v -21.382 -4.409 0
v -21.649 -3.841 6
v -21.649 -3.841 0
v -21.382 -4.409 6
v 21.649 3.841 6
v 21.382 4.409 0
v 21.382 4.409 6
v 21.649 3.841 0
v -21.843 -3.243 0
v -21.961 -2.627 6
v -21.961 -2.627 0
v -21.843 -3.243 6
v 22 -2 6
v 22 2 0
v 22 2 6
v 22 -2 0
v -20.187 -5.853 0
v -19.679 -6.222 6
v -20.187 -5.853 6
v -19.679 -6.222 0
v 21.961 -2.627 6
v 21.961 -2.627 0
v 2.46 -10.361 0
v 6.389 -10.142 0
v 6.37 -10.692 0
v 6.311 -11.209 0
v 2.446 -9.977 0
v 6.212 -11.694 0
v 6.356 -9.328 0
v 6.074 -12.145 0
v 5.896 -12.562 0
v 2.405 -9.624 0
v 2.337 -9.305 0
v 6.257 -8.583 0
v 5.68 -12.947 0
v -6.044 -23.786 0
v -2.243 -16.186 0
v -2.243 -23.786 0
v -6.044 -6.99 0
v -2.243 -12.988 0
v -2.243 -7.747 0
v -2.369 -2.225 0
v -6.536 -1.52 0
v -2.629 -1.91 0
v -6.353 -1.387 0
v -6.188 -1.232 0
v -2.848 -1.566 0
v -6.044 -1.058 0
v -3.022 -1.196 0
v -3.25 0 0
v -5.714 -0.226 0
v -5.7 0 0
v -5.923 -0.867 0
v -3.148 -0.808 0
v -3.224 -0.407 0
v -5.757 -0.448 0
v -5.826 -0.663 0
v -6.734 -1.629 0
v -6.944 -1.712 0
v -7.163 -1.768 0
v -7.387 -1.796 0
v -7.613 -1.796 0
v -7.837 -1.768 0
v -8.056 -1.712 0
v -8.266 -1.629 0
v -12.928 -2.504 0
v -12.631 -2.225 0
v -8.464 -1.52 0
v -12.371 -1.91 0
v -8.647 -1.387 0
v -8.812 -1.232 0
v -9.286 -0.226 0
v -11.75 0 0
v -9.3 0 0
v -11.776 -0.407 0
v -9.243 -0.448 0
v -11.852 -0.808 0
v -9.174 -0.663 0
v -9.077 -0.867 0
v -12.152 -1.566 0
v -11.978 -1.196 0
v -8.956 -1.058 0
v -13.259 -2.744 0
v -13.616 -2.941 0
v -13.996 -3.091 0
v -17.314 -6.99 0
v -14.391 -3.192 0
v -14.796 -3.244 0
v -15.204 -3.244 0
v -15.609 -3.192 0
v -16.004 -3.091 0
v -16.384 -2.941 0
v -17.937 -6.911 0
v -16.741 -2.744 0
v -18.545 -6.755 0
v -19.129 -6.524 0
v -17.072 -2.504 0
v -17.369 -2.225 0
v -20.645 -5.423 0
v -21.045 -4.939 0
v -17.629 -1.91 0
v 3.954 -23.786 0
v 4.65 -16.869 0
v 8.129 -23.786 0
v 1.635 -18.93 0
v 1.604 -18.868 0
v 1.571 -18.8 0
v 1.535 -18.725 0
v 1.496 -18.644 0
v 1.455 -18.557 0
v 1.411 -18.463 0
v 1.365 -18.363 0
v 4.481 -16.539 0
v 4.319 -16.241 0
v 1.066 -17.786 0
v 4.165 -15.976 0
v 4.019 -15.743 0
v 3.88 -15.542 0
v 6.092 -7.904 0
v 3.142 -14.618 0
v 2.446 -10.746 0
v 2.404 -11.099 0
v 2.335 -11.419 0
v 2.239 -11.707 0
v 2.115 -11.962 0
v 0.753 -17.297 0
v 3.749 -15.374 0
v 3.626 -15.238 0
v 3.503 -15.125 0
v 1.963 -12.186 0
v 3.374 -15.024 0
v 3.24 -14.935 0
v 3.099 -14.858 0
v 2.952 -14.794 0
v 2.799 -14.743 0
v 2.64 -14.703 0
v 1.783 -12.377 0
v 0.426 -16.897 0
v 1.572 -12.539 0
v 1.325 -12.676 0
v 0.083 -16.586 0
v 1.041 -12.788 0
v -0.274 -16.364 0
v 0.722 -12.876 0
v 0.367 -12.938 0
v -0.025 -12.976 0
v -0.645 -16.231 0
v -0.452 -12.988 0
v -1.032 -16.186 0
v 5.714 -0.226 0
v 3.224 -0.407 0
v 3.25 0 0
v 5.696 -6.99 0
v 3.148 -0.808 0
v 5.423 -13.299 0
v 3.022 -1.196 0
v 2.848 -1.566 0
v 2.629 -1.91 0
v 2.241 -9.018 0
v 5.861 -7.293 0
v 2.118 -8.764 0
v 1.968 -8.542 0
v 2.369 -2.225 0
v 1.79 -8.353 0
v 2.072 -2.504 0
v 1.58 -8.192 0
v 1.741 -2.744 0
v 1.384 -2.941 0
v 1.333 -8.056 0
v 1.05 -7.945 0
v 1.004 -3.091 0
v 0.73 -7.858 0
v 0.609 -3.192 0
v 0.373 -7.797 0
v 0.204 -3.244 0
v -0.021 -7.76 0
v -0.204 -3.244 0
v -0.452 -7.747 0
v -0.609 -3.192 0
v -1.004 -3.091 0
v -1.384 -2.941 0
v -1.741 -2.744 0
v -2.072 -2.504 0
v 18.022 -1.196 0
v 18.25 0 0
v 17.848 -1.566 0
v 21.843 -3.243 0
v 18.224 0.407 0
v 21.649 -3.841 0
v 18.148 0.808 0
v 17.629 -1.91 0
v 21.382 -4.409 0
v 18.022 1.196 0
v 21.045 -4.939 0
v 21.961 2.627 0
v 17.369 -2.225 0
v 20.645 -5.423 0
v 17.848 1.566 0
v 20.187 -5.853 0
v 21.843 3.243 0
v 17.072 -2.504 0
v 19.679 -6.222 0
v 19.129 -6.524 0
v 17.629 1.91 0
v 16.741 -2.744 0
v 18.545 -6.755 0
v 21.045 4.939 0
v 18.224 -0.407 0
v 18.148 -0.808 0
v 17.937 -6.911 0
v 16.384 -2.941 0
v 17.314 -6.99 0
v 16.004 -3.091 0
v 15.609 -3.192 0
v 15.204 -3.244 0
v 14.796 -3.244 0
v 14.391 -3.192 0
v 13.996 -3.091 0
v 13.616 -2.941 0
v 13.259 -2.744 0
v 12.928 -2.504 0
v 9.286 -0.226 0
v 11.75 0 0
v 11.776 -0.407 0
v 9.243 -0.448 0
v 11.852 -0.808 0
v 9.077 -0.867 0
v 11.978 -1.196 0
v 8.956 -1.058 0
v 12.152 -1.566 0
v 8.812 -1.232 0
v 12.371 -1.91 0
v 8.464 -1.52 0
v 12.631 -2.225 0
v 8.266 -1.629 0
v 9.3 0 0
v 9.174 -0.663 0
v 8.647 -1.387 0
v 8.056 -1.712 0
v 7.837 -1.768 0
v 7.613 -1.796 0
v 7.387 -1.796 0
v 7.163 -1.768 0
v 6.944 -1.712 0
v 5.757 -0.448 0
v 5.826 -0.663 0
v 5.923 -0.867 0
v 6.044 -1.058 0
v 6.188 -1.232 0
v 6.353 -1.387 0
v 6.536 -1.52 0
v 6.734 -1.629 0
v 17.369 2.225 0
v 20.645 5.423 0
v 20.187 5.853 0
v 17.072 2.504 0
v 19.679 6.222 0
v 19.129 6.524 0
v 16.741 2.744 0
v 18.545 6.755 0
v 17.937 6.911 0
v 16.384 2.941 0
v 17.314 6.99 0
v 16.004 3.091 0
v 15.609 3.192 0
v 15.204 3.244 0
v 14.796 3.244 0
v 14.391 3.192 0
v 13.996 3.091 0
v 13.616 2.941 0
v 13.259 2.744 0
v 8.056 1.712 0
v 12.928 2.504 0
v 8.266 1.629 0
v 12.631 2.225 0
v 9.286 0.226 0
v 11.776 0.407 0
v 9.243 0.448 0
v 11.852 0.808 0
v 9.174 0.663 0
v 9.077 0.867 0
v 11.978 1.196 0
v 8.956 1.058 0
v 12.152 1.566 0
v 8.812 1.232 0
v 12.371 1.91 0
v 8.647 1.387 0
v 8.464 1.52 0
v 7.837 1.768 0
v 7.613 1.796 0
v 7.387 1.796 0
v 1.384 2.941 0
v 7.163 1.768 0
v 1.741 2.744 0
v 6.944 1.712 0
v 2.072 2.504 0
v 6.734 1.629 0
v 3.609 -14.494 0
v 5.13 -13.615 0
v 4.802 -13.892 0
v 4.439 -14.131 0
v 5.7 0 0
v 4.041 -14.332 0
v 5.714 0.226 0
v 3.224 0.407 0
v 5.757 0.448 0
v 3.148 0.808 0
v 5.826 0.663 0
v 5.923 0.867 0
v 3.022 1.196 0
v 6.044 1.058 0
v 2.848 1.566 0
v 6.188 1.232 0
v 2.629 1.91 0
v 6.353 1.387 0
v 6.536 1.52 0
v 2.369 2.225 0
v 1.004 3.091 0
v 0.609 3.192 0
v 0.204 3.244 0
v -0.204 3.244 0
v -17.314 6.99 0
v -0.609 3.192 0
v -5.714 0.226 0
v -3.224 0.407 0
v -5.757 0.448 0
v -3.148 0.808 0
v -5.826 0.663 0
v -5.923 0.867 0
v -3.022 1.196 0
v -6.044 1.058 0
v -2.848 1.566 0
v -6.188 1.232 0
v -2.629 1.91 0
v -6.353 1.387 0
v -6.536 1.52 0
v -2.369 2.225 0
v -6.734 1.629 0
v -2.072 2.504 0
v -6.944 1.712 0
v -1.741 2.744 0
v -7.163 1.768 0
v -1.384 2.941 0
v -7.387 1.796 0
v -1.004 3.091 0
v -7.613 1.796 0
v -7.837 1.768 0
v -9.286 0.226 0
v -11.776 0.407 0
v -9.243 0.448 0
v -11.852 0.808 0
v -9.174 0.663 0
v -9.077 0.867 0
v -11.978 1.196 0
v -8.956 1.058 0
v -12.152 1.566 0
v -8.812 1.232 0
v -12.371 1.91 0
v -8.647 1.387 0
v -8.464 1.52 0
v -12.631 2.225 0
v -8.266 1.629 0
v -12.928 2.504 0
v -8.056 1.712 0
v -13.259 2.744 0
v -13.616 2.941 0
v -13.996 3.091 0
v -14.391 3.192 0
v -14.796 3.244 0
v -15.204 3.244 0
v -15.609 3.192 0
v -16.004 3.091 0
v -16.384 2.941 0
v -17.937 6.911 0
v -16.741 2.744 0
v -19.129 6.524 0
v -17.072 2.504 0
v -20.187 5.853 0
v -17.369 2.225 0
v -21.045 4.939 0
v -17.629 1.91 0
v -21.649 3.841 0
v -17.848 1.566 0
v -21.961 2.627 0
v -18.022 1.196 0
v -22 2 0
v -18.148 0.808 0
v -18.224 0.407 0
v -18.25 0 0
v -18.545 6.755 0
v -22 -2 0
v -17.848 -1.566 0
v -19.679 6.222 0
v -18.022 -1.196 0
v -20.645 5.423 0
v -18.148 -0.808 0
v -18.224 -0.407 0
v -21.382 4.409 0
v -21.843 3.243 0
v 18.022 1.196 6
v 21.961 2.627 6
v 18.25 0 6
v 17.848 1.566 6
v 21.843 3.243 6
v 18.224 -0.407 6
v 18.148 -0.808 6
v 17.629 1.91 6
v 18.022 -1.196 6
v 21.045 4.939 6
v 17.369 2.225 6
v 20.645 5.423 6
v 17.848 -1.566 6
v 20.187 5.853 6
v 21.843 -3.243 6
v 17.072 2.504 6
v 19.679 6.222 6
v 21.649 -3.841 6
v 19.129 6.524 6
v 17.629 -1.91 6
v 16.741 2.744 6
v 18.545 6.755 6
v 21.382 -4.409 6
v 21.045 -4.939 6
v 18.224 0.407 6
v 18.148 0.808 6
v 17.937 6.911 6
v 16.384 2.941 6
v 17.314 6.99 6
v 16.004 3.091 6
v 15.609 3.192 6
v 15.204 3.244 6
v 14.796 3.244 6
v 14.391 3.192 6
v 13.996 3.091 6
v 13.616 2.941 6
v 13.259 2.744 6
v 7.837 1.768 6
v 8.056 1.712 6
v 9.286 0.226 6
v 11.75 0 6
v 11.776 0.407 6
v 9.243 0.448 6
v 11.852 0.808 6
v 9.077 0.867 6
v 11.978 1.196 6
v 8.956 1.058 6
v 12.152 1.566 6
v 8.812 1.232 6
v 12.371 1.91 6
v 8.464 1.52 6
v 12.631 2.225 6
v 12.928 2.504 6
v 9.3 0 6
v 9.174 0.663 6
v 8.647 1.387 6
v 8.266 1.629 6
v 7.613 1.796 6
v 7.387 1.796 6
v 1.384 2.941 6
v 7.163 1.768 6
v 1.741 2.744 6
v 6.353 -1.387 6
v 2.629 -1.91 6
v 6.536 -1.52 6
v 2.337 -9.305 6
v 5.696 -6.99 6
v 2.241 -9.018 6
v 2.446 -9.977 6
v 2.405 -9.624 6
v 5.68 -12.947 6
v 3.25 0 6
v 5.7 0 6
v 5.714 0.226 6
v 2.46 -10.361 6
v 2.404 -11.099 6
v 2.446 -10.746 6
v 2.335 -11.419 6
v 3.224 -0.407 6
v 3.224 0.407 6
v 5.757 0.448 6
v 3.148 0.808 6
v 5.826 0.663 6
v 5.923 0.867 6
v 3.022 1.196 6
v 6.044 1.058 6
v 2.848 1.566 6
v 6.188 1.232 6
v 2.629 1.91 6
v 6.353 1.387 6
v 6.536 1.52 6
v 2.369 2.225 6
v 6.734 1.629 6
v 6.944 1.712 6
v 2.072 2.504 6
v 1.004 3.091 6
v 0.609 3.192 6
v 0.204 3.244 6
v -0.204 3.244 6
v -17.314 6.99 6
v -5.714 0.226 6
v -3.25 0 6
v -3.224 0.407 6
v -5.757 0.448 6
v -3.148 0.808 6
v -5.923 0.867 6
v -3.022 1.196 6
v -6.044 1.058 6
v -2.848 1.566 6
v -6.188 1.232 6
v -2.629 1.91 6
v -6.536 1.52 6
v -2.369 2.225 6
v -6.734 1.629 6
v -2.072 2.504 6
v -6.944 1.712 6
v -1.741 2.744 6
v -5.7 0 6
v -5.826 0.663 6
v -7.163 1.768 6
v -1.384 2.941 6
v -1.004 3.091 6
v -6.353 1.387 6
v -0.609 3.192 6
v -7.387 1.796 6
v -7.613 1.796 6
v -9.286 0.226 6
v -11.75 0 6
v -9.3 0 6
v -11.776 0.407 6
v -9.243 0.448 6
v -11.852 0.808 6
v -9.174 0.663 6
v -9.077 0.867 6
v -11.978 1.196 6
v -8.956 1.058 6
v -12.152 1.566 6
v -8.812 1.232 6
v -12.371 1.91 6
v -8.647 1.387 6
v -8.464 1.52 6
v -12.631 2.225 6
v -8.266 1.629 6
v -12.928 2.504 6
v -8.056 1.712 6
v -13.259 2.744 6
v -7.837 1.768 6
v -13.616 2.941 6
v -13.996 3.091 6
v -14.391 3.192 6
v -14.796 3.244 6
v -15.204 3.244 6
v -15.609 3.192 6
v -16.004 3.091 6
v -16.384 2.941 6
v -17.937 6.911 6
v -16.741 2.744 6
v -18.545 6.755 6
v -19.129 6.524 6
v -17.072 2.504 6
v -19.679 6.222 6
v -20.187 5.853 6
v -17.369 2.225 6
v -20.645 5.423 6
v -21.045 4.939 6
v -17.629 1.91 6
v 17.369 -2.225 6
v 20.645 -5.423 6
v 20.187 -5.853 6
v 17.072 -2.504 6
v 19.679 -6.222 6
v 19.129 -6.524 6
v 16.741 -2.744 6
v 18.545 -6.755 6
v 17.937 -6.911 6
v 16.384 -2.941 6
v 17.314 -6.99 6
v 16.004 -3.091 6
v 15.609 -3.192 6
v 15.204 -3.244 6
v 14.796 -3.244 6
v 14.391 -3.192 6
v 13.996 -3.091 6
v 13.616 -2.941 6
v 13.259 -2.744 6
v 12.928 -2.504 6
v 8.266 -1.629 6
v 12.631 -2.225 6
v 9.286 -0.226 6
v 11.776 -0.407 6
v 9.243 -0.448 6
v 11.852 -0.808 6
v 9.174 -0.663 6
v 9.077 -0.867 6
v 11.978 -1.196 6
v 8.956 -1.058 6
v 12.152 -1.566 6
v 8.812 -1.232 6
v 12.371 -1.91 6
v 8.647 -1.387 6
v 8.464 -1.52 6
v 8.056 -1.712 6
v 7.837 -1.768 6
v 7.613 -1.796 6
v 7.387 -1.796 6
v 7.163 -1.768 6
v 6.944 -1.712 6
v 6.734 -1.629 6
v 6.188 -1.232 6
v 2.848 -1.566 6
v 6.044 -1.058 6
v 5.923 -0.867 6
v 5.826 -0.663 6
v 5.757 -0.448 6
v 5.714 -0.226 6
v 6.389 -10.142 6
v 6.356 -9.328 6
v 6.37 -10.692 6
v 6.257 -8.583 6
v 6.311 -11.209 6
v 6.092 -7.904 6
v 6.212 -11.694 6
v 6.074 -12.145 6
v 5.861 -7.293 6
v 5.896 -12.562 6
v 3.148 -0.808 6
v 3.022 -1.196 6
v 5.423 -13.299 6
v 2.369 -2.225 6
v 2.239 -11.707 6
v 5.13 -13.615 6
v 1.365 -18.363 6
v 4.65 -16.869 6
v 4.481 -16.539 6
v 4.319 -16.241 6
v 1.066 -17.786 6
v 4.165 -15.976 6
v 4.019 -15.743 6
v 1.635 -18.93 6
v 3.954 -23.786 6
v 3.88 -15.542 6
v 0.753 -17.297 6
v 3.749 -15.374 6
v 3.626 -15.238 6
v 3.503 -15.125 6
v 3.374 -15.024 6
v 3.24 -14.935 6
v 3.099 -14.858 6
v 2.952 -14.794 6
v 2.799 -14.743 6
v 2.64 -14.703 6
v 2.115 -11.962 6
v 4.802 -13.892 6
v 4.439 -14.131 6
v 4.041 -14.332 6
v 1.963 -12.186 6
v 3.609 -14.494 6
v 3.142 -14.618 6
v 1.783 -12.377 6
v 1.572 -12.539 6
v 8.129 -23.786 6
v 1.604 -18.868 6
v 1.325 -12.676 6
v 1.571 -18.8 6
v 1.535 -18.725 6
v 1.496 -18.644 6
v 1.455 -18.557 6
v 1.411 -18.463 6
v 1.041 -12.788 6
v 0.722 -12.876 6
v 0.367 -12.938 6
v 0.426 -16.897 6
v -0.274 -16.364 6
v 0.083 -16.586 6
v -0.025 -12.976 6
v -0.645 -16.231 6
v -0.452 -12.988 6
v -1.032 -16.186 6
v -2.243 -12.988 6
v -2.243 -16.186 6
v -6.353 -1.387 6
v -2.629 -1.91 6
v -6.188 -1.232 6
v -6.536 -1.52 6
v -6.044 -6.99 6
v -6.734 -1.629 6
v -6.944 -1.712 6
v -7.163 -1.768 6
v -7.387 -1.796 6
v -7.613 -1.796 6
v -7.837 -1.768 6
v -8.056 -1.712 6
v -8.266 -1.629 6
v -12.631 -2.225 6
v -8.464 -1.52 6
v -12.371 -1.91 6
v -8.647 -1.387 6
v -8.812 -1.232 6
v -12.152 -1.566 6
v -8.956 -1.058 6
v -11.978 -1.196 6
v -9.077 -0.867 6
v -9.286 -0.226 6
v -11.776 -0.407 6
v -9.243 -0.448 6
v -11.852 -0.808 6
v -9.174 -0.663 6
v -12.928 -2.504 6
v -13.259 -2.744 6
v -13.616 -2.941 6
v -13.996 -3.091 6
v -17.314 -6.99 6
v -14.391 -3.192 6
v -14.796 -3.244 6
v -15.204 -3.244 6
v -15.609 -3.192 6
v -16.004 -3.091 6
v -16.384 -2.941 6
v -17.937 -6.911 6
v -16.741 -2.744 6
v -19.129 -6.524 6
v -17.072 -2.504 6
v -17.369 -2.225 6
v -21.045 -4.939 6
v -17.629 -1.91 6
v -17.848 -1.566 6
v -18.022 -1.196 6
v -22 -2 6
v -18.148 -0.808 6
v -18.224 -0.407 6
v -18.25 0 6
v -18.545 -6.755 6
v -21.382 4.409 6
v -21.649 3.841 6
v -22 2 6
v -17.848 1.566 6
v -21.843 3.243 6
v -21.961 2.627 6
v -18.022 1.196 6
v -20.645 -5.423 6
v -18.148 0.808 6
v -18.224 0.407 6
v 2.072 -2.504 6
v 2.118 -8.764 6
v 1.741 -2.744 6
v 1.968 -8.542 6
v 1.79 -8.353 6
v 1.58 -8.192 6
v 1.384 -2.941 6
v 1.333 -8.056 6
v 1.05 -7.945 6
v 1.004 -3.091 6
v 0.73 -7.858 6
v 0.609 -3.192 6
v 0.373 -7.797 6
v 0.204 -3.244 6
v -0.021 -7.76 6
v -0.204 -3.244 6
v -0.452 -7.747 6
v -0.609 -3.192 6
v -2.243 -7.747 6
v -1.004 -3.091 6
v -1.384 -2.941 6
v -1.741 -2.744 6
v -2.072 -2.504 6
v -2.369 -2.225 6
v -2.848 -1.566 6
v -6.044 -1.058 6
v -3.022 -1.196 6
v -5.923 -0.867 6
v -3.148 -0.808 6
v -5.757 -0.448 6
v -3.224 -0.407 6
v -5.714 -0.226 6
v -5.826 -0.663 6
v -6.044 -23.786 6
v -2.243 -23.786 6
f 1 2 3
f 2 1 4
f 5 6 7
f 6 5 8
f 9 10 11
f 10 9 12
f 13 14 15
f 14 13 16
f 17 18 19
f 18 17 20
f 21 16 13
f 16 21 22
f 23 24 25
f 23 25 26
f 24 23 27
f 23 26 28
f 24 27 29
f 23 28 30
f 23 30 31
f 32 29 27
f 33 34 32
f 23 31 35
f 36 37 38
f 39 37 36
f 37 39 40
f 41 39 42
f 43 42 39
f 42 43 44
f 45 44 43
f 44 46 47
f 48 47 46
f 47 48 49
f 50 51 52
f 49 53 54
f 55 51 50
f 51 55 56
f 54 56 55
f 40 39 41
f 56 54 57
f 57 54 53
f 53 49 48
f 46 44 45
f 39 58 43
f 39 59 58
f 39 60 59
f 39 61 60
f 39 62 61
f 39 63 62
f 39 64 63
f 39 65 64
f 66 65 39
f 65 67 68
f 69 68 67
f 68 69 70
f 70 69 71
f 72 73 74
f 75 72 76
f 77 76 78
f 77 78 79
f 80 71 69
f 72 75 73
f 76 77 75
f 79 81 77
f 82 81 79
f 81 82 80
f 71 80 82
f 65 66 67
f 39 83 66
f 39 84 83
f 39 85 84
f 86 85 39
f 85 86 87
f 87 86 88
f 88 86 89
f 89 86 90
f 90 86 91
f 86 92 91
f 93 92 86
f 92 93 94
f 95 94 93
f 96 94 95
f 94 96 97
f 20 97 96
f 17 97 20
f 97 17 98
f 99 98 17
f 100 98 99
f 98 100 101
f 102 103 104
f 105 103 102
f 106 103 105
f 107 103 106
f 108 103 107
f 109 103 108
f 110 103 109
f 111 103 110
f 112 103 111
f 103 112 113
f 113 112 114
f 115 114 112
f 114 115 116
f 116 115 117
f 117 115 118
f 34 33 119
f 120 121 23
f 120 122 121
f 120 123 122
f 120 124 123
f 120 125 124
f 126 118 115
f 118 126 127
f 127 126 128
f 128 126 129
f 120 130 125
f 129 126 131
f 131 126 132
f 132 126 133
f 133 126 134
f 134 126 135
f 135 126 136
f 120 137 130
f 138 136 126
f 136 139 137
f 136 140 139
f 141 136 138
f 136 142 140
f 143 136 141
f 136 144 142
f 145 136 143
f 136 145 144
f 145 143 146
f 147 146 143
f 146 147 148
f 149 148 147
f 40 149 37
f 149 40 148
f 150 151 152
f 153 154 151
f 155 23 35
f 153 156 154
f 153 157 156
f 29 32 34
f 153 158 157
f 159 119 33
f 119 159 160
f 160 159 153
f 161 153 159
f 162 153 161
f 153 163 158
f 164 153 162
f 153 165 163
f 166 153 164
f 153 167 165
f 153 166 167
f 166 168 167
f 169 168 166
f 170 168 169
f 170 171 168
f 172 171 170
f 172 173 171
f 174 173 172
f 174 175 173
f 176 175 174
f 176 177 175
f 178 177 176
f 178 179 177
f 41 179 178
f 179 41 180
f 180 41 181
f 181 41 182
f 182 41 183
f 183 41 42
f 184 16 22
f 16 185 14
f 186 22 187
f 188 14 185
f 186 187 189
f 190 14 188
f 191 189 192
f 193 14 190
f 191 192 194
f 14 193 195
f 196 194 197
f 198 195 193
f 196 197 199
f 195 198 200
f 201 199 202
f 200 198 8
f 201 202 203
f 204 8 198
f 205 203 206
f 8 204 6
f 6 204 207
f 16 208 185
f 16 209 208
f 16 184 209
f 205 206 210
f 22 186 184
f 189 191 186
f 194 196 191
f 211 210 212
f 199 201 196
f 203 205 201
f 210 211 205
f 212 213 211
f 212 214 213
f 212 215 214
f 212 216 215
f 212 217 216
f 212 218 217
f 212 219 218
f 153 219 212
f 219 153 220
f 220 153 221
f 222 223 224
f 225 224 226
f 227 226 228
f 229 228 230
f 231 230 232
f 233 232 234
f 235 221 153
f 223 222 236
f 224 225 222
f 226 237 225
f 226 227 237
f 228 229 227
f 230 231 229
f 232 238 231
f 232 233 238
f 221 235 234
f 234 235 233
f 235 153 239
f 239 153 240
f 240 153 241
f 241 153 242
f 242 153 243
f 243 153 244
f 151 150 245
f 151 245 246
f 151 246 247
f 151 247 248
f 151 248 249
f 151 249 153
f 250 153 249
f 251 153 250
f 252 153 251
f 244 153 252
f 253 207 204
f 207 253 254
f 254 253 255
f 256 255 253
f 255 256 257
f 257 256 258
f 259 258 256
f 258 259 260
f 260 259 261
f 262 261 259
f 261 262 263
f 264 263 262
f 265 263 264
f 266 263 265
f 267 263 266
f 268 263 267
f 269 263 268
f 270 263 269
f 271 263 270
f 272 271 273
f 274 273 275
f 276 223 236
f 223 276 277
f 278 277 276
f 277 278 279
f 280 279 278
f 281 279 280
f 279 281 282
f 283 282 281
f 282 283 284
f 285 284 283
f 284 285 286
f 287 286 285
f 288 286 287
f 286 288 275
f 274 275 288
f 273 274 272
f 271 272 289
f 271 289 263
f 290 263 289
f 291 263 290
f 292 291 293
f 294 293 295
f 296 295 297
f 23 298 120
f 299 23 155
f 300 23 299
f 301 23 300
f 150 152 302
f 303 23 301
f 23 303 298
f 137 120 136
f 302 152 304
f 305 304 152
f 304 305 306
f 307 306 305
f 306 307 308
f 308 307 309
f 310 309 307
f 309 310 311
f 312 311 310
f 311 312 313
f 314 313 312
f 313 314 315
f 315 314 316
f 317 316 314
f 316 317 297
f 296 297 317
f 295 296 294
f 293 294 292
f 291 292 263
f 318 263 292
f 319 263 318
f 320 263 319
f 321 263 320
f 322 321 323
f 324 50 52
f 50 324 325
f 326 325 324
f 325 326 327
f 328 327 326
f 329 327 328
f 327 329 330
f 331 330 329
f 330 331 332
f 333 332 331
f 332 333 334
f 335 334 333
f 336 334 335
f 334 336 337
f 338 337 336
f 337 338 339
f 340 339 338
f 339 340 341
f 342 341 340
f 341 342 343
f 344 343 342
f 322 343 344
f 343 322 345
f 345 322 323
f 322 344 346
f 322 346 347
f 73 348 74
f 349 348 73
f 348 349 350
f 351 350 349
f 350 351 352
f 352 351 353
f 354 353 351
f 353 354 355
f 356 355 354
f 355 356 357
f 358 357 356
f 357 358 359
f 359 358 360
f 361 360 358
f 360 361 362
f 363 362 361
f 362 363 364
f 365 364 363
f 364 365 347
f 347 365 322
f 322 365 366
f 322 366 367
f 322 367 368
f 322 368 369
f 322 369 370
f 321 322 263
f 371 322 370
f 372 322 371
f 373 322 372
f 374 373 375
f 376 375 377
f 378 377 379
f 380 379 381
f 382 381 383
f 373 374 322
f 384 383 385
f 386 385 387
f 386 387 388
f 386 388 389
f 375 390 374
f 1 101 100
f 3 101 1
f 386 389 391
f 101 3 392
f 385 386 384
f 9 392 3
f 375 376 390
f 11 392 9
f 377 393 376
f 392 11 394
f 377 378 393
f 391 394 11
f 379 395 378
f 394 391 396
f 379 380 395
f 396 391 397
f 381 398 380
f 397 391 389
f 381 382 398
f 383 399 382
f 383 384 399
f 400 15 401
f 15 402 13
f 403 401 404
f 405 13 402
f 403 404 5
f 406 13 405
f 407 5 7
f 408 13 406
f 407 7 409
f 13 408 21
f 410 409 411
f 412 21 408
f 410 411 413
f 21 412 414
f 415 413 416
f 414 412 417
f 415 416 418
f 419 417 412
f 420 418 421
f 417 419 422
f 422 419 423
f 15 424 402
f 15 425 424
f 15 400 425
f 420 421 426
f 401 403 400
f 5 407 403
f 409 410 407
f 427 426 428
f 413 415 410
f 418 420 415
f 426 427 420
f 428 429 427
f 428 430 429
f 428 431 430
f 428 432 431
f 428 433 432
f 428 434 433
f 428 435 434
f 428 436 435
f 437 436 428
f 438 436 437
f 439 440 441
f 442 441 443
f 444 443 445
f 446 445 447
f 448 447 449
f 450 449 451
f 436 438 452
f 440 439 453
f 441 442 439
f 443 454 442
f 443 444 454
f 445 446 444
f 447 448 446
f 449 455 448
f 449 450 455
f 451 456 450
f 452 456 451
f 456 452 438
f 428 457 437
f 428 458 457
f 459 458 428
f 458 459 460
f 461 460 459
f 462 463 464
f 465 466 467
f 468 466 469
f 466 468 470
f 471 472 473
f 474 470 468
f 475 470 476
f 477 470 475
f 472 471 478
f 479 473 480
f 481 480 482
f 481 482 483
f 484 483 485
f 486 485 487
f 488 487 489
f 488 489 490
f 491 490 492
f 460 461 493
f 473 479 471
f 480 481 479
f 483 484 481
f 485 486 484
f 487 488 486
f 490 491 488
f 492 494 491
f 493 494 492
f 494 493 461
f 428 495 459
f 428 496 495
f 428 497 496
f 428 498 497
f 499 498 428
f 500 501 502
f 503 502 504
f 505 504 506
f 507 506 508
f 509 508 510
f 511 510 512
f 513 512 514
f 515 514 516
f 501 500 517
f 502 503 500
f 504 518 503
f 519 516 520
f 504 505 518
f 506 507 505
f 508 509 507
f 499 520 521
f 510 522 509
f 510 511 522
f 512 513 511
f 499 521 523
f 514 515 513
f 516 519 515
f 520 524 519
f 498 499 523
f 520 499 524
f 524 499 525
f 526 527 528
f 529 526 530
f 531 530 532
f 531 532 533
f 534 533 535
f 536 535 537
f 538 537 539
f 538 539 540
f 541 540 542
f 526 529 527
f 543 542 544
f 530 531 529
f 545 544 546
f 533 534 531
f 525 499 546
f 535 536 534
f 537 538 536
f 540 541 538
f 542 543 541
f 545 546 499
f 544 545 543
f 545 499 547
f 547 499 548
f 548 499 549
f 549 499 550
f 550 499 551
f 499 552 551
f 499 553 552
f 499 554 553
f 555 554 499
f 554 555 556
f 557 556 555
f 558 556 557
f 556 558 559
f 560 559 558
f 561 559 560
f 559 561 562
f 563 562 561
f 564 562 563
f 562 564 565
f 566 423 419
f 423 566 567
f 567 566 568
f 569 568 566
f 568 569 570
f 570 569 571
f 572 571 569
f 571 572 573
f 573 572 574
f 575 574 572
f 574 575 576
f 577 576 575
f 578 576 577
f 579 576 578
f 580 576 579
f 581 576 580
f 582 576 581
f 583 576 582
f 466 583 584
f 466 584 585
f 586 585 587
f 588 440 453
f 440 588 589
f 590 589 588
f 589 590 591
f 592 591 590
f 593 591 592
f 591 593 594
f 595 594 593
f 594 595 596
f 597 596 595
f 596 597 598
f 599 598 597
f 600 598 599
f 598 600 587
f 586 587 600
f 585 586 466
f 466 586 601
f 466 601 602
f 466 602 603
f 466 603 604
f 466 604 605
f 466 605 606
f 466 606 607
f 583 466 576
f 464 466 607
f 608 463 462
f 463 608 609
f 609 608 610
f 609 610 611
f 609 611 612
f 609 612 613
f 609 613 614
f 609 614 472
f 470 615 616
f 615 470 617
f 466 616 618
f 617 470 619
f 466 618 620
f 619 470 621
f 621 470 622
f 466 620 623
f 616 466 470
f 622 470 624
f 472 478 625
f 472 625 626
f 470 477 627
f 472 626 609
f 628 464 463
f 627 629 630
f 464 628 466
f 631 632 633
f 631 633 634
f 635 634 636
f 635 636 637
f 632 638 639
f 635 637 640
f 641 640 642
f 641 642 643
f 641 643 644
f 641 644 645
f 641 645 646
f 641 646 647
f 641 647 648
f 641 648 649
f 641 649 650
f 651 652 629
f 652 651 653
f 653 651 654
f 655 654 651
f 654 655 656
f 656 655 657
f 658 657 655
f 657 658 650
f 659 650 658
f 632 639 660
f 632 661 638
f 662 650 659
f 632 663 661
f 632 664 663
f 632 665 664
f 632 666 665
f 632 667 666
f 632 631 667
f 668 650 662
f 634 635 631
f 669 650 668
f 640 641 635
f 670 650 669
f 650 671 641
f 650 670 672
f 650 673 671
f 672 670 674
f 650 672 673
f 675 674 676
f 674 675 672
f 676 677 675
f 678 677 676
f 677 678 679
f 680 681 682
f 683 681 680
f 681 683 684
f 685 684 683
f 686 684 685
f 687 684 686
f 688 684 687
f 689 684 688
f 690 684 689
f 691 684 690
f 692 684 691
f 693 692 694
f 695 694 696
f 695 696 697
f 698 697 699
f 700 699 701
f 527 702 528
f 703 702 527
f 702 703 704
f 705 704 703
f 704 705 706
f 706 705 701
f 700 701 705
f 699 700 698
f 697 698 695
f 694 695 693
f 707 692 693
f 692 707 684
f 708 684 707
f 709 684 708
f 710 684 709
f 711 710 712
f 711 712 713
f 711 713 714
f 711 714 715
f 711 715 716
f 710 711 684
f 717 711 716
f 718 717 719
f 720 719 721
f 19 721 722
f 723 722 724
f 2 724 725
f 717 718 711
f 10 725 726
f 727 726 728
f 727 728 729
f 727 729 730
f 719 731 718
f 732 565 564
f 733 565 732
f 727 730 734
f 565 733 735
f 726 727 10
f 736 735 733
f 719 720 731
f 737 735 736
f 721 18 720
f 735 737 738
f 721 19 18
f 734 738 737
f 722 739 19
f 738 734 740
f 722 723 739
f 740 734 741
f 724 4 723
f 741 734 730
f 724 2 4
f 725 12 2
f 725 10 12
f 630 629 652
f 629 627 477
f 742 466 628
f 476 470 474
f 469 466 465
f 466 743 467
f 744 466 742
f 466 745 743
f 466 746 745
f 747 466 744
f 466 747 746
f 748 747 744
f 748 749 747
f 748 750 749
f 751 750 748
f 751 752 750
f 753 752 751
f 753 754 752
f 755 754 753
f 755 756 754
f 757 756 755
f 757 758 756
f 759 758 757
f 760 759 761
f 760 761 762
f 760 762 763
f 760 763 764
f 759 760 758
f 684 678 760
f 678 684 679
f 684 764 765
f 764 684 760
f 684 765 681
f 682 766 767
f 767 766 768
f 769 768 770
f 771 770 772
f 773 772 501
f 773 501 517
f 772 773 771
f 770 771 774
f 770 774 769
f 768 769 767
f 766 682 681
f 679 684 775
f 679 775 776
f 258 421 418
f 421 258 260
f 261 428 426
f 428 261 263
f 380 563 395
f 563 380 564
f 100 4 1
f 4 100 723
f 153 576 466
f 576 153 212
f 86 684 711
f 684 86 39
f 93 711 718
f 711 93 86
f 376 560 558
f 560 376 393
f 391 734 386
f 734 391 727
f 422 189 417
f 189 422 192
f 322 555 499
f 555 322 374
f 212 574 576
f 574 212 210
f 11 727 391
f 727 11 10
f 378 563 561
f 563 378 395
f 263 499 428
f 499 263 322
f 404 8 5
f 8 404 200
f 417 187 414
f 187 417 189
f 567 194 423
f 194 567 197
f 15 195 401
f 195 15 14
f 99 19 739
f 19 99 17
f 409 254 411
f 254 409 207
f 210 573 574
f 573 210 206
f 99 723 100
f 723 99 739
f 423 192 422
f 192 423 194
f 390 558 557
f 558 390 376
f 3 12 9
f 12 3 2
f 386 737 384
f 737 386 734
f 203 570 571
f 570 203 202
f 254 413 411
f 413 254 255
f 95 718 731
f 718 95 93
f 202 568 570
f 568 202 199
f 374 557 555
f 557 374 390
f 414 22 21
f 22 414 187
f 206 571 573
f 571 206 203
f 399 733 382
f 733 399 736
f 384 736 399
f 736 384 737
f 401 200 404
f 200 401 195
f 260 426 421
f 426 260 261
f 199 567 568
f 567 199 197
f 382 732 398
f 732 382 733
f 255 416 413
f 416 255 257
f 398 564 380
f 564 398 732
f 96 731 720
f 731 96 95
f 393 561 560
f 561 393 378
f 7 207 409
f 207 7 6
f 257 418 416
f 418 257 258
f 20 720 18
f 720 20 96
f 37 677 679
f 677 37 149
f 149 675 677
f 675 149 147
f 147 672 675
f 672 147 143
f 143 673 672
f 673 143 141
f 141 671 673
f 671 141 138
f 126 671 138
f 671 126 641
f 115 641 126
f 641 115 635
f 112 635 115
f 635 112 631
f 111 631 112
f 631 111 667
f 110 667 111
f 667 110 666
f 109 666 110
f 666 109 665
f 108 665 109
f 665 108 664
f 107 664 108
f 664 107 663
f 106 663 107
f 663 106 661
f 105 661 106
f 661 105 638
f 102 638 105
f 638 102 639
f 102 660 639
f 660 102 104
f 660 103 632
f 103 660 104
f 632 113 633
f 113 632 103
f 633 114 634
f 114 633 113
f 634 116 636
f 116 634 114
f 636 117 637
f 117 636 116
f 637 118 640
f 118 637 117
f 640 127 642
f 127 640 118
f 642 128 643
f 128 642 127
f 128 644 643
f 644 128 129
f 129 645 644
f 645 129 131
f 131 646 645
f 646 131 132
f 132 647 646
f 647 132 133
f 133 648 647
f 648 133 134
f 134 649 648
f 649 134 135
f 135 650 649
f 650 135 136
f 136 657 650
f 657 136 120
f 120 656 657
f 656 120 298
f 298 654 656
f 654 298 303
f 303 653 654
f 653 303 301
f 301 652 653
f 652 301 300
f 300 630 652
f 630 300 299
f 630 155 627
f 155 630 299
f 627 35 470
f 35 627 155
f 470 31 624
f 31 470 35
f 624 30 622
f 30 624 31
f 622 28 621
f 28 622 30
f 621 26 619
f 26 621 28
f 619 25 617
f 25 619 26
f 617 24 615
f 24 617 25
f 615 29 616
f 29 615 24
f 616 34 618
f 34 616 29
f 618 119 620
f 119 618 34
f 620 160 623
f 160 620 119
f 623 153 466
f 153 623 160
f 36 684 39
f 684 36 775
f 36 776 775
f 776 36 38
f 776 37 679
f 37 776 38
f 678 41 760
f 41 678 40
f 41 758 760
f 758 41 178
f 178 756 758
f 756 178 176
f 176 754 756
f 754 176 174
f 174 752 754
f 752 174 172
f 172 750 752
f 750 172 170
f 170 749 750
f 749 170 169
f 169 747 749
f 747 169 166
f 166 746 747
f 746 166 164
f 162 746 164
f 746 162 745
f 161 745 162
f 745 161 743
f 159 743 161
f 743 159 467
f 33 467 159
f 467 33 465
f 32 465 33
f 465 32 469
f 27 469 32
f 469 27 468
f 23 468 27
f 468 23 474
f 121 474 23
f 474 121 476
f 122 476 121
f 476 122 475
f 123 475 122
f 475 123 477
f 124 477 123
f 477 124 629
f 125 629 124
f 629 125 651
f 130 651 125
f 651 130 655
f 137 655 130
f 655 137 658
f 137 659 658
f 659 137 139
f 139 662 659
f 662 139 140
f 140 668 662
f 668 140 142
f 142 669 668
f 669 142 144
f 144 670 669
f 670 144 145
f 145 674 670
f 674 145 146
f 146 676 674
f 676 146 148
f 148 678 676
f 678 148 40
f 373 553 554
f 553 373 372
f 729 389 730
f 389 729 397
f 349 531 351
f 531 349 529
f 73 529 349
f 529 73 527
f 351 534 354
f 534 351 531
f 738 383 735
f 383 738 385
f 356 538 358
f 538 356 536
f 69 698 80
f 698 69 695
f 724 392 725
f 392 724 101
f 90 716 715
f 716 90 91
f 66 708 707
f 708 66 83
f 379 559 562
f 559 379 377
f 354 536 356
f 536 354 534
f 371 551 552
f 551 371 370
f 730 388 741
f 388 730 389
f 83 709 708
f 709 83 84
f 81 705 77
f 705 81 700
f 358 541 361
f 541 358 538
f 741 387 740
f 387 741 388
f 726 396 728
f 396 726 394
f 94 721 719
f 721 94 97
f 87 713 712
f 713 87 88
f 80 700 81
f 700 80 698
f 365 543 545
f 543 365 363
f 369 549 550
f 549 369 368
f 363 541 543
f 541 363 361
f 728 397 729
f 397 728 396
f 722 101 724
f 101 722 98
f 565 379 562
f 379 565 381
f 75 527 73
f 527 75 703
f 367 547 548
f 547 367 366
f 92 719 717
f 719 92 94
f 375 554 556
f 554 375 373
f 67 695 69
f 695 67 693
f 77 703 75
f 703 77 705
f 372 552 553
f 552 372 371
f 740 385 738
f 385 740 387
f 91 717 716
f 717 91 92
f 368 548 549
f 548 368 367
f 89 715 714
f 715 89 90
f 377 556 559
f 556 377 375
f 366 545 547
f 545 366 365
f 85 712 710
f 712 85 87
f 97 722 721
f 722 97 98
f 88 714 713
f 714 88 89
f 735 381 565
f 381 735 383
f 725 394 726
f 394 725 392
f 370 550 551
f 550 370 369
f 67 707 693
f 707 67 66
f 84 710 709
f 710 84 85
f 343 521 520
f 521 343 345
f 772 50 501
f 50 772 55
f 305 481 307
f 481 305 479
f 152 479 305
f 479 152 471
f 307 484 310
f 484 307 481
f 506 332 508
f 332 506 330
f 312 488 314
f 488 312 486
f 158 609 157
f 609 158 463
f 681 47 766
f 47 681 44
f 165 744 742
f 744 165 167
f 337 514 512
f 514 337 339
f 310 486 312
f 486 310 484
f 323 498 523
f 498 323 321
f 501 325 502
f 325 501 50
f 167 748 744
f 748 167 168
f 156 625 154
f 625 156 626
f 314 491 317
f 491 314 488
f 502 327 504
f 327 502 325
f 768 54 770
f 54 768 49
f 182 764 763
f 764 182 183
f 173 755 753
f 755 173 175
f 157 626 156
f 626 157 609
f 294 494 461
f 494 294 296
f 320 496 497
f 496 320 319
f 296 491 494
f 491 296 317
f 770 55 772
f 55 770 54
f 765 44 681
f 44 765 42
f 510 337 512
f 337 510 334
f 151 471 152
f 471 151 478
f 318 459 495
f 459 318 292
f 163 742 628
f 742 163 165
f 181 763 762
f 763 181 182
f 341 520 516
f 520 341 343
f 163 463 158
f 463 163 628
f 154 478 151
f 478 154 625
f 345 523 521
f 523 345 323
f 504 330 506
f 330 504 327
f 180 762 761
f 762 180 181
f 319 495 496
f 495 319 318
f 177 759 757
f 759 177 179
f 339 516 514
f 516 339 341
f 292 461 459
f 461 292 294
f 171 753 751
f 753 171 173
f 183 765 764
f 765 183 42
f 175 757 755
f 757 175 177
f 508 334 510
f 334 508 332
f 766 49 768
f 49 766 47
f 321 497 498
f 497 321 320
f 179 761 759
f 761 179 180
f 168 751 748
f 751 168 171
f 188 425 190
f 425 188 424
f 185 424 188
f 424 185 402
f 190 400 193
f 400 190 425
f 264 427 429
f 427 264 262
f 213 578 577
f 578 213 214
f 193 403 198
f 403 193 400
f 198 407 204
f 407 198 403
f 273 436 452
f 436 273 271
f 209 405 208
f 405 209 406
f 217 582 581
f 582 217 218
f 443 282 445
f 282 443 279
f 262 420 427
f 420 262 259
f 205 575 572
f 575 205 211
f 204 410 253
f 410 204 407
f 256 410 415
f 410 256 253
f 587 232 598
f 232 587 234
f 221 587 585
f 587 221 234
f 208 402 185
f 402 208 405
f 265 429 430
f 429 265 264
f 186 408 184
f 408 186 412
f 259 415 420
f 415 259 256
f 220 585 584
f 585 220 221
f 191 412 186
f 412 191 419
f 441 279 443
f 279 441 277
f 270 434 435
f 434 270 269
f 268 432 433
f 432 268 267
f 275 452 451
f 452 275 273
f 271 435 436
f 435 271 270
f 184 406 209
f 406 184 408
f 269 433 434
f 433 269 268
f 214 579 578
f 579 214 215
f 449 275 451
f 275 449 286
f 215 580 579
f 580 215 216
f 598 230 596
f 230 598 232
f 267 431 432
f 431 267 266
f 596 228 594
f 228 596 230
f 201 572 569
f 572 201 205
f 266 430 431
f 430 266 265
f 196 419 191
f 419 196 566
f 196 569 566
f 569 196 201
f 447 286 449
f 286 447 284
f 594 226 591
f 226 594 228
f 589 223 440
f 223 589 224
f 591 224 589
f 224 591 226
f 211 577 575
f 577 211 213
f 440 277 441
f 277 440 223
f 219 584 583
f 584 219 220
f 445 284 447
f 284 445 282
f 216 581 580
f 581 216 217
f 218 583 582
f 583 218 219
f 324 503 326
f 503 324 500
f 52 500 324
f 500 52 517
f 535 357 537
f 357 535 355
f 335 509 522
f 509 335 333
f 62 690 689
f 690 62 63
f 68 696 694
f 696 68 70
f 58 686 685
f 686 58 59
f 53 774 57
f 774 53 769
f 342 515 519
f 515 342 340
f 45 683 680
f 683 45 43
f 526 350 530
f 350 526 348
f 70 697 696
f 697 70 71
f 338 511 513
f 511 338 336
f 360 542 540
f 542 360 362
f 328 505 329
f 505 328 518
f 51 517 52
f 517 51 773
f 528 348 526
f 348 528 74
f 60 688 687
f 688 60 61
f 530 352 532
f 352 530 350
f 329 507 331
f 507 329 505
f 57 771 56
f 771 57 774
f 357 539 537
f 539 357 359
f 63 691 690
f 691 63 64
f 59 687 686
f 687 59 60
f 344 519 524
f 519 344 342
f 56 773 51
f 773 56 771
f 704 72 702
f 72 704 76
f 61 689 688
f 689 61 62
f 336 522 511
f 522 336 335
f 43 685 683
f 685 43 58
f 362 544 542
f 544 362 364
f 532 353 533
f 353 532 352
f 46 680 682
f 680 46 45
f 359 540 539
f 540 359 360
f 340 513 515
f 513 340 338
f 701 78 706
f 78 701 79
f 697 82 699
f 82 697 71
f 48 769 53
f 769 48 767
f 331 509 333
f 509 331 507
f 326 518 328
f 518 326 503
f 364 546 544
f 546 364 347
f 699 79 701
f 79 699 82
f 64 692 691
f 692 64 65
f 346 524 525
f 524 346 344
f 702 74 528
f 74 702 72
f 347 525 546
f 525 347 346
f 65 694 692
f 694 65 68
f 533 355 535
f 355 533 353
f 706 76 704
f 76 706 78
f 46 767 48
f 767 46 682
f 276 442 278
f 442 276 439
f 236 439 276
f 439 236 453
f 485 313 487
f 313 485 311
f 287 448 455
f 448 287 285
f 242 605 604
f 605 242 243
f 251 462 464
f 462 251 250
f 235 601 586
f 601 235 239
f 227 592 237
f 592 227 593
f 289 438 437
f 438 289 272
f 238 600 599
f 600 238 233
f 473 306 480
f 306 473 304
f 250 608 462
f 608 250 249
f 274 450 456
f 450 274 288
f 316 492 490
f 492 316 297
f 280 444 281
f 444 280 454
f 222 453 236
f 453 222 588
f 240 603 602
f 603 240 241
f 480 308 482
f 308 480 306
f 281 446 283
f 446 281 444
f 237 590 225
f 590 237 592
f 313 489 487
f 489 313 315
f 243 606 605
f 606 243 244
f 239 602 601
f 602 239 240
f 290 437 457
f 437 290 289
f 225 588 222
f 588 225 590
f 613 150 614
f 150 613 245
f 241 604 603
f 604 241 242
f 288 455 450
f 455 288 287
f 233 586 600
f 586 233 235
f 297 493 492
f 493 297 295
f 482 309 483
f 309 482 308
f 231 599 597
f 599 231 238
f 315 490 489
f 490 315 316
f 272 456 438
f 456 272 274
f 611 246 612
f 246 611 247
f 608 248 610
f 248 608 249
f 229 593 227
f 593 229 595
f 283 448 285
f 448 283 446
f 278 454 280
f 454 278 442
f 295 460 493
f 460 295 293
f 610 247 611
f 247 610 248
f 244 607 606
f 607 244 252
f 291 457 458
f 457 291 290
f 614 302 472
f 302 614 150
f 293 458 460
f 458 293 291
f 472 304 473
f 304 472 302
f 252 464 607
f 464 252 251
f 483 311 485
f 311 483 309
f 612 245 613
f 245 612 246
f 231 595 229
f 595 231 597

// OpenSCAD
$fn = 50;


difference() {
	union() {
		hull() {
			translate(v = [-17.0000000000, 2.0000000000, 0]) {
				cylinder(h = 6, r = 5);
			}
			translate(v = [17.0000000000, 2.0000000000, 0]) {
				cylinder(h = 6, r = 5);
			}
			translate(v = [-17.0000000000, -2.0000000000, 0]) {
				cylinder(h = 6, r = 5);
			}
			translate(v = [17.0000000000, -2.0000000000, 0]) {
				cylinder(h = 6, r = 5);
			}
		}
		translate(v = [0, -5, 0]) {
			linear_extrude(height = 6) {
				text(font = "DejaVu Sans Mono:style=Bold", halign = "center", size = 19.0000000000, text = "R", valign = "top");
			}
		}
	}
	union() {
		translate(v = [-15.0000000000, 0.0000000000, 0]) {
			translate(v = [0, 0, -100]) {
				cylinder(h = 200, r = 3.2500000000);
			}
		}
		translate(v = [0, 0, -100]) {
			cylinder(h = 200, r = 3.2500000000);
		}
		translate(v = [15.0000000000, 0.0000000000, 0]) {
			translate(v = [0, 0, -100]) {
				cylinder(h = 200, r = 3.2500000000);
			}
		}
		translate(v = [-15.0000000000, 0.0000000000, 0]) {
			translate(v = [0, 0, -100]) {
				cylinder(h = 200, r = 1.8000000000);
			}
		}
		translate(v = [-7.5000000000, 0.0000000000, 0]) {
			translate(v = [0, 0, -100]) {
				cylinder(h = 200, r = 1.8000000000);
			}
		}
		translate(v = [0, 0, -100]) {
			cylinder(h = 200, r = 1.8000000000);
		}
		translate(v = [7.5000000000, 0.0000000000, 0]) {
			translate(v = [0, 0, -100]) {
				cylinder(h = 200, r = 1.8000000000);
			}
		}
		translate(v = [15.0000000000, 0.0000000000, 0]) {
			translate(v = [0, 0, -100]) {
				cylinder(h = 200, r = 1.8000000000);
			}
		}
	}
}
